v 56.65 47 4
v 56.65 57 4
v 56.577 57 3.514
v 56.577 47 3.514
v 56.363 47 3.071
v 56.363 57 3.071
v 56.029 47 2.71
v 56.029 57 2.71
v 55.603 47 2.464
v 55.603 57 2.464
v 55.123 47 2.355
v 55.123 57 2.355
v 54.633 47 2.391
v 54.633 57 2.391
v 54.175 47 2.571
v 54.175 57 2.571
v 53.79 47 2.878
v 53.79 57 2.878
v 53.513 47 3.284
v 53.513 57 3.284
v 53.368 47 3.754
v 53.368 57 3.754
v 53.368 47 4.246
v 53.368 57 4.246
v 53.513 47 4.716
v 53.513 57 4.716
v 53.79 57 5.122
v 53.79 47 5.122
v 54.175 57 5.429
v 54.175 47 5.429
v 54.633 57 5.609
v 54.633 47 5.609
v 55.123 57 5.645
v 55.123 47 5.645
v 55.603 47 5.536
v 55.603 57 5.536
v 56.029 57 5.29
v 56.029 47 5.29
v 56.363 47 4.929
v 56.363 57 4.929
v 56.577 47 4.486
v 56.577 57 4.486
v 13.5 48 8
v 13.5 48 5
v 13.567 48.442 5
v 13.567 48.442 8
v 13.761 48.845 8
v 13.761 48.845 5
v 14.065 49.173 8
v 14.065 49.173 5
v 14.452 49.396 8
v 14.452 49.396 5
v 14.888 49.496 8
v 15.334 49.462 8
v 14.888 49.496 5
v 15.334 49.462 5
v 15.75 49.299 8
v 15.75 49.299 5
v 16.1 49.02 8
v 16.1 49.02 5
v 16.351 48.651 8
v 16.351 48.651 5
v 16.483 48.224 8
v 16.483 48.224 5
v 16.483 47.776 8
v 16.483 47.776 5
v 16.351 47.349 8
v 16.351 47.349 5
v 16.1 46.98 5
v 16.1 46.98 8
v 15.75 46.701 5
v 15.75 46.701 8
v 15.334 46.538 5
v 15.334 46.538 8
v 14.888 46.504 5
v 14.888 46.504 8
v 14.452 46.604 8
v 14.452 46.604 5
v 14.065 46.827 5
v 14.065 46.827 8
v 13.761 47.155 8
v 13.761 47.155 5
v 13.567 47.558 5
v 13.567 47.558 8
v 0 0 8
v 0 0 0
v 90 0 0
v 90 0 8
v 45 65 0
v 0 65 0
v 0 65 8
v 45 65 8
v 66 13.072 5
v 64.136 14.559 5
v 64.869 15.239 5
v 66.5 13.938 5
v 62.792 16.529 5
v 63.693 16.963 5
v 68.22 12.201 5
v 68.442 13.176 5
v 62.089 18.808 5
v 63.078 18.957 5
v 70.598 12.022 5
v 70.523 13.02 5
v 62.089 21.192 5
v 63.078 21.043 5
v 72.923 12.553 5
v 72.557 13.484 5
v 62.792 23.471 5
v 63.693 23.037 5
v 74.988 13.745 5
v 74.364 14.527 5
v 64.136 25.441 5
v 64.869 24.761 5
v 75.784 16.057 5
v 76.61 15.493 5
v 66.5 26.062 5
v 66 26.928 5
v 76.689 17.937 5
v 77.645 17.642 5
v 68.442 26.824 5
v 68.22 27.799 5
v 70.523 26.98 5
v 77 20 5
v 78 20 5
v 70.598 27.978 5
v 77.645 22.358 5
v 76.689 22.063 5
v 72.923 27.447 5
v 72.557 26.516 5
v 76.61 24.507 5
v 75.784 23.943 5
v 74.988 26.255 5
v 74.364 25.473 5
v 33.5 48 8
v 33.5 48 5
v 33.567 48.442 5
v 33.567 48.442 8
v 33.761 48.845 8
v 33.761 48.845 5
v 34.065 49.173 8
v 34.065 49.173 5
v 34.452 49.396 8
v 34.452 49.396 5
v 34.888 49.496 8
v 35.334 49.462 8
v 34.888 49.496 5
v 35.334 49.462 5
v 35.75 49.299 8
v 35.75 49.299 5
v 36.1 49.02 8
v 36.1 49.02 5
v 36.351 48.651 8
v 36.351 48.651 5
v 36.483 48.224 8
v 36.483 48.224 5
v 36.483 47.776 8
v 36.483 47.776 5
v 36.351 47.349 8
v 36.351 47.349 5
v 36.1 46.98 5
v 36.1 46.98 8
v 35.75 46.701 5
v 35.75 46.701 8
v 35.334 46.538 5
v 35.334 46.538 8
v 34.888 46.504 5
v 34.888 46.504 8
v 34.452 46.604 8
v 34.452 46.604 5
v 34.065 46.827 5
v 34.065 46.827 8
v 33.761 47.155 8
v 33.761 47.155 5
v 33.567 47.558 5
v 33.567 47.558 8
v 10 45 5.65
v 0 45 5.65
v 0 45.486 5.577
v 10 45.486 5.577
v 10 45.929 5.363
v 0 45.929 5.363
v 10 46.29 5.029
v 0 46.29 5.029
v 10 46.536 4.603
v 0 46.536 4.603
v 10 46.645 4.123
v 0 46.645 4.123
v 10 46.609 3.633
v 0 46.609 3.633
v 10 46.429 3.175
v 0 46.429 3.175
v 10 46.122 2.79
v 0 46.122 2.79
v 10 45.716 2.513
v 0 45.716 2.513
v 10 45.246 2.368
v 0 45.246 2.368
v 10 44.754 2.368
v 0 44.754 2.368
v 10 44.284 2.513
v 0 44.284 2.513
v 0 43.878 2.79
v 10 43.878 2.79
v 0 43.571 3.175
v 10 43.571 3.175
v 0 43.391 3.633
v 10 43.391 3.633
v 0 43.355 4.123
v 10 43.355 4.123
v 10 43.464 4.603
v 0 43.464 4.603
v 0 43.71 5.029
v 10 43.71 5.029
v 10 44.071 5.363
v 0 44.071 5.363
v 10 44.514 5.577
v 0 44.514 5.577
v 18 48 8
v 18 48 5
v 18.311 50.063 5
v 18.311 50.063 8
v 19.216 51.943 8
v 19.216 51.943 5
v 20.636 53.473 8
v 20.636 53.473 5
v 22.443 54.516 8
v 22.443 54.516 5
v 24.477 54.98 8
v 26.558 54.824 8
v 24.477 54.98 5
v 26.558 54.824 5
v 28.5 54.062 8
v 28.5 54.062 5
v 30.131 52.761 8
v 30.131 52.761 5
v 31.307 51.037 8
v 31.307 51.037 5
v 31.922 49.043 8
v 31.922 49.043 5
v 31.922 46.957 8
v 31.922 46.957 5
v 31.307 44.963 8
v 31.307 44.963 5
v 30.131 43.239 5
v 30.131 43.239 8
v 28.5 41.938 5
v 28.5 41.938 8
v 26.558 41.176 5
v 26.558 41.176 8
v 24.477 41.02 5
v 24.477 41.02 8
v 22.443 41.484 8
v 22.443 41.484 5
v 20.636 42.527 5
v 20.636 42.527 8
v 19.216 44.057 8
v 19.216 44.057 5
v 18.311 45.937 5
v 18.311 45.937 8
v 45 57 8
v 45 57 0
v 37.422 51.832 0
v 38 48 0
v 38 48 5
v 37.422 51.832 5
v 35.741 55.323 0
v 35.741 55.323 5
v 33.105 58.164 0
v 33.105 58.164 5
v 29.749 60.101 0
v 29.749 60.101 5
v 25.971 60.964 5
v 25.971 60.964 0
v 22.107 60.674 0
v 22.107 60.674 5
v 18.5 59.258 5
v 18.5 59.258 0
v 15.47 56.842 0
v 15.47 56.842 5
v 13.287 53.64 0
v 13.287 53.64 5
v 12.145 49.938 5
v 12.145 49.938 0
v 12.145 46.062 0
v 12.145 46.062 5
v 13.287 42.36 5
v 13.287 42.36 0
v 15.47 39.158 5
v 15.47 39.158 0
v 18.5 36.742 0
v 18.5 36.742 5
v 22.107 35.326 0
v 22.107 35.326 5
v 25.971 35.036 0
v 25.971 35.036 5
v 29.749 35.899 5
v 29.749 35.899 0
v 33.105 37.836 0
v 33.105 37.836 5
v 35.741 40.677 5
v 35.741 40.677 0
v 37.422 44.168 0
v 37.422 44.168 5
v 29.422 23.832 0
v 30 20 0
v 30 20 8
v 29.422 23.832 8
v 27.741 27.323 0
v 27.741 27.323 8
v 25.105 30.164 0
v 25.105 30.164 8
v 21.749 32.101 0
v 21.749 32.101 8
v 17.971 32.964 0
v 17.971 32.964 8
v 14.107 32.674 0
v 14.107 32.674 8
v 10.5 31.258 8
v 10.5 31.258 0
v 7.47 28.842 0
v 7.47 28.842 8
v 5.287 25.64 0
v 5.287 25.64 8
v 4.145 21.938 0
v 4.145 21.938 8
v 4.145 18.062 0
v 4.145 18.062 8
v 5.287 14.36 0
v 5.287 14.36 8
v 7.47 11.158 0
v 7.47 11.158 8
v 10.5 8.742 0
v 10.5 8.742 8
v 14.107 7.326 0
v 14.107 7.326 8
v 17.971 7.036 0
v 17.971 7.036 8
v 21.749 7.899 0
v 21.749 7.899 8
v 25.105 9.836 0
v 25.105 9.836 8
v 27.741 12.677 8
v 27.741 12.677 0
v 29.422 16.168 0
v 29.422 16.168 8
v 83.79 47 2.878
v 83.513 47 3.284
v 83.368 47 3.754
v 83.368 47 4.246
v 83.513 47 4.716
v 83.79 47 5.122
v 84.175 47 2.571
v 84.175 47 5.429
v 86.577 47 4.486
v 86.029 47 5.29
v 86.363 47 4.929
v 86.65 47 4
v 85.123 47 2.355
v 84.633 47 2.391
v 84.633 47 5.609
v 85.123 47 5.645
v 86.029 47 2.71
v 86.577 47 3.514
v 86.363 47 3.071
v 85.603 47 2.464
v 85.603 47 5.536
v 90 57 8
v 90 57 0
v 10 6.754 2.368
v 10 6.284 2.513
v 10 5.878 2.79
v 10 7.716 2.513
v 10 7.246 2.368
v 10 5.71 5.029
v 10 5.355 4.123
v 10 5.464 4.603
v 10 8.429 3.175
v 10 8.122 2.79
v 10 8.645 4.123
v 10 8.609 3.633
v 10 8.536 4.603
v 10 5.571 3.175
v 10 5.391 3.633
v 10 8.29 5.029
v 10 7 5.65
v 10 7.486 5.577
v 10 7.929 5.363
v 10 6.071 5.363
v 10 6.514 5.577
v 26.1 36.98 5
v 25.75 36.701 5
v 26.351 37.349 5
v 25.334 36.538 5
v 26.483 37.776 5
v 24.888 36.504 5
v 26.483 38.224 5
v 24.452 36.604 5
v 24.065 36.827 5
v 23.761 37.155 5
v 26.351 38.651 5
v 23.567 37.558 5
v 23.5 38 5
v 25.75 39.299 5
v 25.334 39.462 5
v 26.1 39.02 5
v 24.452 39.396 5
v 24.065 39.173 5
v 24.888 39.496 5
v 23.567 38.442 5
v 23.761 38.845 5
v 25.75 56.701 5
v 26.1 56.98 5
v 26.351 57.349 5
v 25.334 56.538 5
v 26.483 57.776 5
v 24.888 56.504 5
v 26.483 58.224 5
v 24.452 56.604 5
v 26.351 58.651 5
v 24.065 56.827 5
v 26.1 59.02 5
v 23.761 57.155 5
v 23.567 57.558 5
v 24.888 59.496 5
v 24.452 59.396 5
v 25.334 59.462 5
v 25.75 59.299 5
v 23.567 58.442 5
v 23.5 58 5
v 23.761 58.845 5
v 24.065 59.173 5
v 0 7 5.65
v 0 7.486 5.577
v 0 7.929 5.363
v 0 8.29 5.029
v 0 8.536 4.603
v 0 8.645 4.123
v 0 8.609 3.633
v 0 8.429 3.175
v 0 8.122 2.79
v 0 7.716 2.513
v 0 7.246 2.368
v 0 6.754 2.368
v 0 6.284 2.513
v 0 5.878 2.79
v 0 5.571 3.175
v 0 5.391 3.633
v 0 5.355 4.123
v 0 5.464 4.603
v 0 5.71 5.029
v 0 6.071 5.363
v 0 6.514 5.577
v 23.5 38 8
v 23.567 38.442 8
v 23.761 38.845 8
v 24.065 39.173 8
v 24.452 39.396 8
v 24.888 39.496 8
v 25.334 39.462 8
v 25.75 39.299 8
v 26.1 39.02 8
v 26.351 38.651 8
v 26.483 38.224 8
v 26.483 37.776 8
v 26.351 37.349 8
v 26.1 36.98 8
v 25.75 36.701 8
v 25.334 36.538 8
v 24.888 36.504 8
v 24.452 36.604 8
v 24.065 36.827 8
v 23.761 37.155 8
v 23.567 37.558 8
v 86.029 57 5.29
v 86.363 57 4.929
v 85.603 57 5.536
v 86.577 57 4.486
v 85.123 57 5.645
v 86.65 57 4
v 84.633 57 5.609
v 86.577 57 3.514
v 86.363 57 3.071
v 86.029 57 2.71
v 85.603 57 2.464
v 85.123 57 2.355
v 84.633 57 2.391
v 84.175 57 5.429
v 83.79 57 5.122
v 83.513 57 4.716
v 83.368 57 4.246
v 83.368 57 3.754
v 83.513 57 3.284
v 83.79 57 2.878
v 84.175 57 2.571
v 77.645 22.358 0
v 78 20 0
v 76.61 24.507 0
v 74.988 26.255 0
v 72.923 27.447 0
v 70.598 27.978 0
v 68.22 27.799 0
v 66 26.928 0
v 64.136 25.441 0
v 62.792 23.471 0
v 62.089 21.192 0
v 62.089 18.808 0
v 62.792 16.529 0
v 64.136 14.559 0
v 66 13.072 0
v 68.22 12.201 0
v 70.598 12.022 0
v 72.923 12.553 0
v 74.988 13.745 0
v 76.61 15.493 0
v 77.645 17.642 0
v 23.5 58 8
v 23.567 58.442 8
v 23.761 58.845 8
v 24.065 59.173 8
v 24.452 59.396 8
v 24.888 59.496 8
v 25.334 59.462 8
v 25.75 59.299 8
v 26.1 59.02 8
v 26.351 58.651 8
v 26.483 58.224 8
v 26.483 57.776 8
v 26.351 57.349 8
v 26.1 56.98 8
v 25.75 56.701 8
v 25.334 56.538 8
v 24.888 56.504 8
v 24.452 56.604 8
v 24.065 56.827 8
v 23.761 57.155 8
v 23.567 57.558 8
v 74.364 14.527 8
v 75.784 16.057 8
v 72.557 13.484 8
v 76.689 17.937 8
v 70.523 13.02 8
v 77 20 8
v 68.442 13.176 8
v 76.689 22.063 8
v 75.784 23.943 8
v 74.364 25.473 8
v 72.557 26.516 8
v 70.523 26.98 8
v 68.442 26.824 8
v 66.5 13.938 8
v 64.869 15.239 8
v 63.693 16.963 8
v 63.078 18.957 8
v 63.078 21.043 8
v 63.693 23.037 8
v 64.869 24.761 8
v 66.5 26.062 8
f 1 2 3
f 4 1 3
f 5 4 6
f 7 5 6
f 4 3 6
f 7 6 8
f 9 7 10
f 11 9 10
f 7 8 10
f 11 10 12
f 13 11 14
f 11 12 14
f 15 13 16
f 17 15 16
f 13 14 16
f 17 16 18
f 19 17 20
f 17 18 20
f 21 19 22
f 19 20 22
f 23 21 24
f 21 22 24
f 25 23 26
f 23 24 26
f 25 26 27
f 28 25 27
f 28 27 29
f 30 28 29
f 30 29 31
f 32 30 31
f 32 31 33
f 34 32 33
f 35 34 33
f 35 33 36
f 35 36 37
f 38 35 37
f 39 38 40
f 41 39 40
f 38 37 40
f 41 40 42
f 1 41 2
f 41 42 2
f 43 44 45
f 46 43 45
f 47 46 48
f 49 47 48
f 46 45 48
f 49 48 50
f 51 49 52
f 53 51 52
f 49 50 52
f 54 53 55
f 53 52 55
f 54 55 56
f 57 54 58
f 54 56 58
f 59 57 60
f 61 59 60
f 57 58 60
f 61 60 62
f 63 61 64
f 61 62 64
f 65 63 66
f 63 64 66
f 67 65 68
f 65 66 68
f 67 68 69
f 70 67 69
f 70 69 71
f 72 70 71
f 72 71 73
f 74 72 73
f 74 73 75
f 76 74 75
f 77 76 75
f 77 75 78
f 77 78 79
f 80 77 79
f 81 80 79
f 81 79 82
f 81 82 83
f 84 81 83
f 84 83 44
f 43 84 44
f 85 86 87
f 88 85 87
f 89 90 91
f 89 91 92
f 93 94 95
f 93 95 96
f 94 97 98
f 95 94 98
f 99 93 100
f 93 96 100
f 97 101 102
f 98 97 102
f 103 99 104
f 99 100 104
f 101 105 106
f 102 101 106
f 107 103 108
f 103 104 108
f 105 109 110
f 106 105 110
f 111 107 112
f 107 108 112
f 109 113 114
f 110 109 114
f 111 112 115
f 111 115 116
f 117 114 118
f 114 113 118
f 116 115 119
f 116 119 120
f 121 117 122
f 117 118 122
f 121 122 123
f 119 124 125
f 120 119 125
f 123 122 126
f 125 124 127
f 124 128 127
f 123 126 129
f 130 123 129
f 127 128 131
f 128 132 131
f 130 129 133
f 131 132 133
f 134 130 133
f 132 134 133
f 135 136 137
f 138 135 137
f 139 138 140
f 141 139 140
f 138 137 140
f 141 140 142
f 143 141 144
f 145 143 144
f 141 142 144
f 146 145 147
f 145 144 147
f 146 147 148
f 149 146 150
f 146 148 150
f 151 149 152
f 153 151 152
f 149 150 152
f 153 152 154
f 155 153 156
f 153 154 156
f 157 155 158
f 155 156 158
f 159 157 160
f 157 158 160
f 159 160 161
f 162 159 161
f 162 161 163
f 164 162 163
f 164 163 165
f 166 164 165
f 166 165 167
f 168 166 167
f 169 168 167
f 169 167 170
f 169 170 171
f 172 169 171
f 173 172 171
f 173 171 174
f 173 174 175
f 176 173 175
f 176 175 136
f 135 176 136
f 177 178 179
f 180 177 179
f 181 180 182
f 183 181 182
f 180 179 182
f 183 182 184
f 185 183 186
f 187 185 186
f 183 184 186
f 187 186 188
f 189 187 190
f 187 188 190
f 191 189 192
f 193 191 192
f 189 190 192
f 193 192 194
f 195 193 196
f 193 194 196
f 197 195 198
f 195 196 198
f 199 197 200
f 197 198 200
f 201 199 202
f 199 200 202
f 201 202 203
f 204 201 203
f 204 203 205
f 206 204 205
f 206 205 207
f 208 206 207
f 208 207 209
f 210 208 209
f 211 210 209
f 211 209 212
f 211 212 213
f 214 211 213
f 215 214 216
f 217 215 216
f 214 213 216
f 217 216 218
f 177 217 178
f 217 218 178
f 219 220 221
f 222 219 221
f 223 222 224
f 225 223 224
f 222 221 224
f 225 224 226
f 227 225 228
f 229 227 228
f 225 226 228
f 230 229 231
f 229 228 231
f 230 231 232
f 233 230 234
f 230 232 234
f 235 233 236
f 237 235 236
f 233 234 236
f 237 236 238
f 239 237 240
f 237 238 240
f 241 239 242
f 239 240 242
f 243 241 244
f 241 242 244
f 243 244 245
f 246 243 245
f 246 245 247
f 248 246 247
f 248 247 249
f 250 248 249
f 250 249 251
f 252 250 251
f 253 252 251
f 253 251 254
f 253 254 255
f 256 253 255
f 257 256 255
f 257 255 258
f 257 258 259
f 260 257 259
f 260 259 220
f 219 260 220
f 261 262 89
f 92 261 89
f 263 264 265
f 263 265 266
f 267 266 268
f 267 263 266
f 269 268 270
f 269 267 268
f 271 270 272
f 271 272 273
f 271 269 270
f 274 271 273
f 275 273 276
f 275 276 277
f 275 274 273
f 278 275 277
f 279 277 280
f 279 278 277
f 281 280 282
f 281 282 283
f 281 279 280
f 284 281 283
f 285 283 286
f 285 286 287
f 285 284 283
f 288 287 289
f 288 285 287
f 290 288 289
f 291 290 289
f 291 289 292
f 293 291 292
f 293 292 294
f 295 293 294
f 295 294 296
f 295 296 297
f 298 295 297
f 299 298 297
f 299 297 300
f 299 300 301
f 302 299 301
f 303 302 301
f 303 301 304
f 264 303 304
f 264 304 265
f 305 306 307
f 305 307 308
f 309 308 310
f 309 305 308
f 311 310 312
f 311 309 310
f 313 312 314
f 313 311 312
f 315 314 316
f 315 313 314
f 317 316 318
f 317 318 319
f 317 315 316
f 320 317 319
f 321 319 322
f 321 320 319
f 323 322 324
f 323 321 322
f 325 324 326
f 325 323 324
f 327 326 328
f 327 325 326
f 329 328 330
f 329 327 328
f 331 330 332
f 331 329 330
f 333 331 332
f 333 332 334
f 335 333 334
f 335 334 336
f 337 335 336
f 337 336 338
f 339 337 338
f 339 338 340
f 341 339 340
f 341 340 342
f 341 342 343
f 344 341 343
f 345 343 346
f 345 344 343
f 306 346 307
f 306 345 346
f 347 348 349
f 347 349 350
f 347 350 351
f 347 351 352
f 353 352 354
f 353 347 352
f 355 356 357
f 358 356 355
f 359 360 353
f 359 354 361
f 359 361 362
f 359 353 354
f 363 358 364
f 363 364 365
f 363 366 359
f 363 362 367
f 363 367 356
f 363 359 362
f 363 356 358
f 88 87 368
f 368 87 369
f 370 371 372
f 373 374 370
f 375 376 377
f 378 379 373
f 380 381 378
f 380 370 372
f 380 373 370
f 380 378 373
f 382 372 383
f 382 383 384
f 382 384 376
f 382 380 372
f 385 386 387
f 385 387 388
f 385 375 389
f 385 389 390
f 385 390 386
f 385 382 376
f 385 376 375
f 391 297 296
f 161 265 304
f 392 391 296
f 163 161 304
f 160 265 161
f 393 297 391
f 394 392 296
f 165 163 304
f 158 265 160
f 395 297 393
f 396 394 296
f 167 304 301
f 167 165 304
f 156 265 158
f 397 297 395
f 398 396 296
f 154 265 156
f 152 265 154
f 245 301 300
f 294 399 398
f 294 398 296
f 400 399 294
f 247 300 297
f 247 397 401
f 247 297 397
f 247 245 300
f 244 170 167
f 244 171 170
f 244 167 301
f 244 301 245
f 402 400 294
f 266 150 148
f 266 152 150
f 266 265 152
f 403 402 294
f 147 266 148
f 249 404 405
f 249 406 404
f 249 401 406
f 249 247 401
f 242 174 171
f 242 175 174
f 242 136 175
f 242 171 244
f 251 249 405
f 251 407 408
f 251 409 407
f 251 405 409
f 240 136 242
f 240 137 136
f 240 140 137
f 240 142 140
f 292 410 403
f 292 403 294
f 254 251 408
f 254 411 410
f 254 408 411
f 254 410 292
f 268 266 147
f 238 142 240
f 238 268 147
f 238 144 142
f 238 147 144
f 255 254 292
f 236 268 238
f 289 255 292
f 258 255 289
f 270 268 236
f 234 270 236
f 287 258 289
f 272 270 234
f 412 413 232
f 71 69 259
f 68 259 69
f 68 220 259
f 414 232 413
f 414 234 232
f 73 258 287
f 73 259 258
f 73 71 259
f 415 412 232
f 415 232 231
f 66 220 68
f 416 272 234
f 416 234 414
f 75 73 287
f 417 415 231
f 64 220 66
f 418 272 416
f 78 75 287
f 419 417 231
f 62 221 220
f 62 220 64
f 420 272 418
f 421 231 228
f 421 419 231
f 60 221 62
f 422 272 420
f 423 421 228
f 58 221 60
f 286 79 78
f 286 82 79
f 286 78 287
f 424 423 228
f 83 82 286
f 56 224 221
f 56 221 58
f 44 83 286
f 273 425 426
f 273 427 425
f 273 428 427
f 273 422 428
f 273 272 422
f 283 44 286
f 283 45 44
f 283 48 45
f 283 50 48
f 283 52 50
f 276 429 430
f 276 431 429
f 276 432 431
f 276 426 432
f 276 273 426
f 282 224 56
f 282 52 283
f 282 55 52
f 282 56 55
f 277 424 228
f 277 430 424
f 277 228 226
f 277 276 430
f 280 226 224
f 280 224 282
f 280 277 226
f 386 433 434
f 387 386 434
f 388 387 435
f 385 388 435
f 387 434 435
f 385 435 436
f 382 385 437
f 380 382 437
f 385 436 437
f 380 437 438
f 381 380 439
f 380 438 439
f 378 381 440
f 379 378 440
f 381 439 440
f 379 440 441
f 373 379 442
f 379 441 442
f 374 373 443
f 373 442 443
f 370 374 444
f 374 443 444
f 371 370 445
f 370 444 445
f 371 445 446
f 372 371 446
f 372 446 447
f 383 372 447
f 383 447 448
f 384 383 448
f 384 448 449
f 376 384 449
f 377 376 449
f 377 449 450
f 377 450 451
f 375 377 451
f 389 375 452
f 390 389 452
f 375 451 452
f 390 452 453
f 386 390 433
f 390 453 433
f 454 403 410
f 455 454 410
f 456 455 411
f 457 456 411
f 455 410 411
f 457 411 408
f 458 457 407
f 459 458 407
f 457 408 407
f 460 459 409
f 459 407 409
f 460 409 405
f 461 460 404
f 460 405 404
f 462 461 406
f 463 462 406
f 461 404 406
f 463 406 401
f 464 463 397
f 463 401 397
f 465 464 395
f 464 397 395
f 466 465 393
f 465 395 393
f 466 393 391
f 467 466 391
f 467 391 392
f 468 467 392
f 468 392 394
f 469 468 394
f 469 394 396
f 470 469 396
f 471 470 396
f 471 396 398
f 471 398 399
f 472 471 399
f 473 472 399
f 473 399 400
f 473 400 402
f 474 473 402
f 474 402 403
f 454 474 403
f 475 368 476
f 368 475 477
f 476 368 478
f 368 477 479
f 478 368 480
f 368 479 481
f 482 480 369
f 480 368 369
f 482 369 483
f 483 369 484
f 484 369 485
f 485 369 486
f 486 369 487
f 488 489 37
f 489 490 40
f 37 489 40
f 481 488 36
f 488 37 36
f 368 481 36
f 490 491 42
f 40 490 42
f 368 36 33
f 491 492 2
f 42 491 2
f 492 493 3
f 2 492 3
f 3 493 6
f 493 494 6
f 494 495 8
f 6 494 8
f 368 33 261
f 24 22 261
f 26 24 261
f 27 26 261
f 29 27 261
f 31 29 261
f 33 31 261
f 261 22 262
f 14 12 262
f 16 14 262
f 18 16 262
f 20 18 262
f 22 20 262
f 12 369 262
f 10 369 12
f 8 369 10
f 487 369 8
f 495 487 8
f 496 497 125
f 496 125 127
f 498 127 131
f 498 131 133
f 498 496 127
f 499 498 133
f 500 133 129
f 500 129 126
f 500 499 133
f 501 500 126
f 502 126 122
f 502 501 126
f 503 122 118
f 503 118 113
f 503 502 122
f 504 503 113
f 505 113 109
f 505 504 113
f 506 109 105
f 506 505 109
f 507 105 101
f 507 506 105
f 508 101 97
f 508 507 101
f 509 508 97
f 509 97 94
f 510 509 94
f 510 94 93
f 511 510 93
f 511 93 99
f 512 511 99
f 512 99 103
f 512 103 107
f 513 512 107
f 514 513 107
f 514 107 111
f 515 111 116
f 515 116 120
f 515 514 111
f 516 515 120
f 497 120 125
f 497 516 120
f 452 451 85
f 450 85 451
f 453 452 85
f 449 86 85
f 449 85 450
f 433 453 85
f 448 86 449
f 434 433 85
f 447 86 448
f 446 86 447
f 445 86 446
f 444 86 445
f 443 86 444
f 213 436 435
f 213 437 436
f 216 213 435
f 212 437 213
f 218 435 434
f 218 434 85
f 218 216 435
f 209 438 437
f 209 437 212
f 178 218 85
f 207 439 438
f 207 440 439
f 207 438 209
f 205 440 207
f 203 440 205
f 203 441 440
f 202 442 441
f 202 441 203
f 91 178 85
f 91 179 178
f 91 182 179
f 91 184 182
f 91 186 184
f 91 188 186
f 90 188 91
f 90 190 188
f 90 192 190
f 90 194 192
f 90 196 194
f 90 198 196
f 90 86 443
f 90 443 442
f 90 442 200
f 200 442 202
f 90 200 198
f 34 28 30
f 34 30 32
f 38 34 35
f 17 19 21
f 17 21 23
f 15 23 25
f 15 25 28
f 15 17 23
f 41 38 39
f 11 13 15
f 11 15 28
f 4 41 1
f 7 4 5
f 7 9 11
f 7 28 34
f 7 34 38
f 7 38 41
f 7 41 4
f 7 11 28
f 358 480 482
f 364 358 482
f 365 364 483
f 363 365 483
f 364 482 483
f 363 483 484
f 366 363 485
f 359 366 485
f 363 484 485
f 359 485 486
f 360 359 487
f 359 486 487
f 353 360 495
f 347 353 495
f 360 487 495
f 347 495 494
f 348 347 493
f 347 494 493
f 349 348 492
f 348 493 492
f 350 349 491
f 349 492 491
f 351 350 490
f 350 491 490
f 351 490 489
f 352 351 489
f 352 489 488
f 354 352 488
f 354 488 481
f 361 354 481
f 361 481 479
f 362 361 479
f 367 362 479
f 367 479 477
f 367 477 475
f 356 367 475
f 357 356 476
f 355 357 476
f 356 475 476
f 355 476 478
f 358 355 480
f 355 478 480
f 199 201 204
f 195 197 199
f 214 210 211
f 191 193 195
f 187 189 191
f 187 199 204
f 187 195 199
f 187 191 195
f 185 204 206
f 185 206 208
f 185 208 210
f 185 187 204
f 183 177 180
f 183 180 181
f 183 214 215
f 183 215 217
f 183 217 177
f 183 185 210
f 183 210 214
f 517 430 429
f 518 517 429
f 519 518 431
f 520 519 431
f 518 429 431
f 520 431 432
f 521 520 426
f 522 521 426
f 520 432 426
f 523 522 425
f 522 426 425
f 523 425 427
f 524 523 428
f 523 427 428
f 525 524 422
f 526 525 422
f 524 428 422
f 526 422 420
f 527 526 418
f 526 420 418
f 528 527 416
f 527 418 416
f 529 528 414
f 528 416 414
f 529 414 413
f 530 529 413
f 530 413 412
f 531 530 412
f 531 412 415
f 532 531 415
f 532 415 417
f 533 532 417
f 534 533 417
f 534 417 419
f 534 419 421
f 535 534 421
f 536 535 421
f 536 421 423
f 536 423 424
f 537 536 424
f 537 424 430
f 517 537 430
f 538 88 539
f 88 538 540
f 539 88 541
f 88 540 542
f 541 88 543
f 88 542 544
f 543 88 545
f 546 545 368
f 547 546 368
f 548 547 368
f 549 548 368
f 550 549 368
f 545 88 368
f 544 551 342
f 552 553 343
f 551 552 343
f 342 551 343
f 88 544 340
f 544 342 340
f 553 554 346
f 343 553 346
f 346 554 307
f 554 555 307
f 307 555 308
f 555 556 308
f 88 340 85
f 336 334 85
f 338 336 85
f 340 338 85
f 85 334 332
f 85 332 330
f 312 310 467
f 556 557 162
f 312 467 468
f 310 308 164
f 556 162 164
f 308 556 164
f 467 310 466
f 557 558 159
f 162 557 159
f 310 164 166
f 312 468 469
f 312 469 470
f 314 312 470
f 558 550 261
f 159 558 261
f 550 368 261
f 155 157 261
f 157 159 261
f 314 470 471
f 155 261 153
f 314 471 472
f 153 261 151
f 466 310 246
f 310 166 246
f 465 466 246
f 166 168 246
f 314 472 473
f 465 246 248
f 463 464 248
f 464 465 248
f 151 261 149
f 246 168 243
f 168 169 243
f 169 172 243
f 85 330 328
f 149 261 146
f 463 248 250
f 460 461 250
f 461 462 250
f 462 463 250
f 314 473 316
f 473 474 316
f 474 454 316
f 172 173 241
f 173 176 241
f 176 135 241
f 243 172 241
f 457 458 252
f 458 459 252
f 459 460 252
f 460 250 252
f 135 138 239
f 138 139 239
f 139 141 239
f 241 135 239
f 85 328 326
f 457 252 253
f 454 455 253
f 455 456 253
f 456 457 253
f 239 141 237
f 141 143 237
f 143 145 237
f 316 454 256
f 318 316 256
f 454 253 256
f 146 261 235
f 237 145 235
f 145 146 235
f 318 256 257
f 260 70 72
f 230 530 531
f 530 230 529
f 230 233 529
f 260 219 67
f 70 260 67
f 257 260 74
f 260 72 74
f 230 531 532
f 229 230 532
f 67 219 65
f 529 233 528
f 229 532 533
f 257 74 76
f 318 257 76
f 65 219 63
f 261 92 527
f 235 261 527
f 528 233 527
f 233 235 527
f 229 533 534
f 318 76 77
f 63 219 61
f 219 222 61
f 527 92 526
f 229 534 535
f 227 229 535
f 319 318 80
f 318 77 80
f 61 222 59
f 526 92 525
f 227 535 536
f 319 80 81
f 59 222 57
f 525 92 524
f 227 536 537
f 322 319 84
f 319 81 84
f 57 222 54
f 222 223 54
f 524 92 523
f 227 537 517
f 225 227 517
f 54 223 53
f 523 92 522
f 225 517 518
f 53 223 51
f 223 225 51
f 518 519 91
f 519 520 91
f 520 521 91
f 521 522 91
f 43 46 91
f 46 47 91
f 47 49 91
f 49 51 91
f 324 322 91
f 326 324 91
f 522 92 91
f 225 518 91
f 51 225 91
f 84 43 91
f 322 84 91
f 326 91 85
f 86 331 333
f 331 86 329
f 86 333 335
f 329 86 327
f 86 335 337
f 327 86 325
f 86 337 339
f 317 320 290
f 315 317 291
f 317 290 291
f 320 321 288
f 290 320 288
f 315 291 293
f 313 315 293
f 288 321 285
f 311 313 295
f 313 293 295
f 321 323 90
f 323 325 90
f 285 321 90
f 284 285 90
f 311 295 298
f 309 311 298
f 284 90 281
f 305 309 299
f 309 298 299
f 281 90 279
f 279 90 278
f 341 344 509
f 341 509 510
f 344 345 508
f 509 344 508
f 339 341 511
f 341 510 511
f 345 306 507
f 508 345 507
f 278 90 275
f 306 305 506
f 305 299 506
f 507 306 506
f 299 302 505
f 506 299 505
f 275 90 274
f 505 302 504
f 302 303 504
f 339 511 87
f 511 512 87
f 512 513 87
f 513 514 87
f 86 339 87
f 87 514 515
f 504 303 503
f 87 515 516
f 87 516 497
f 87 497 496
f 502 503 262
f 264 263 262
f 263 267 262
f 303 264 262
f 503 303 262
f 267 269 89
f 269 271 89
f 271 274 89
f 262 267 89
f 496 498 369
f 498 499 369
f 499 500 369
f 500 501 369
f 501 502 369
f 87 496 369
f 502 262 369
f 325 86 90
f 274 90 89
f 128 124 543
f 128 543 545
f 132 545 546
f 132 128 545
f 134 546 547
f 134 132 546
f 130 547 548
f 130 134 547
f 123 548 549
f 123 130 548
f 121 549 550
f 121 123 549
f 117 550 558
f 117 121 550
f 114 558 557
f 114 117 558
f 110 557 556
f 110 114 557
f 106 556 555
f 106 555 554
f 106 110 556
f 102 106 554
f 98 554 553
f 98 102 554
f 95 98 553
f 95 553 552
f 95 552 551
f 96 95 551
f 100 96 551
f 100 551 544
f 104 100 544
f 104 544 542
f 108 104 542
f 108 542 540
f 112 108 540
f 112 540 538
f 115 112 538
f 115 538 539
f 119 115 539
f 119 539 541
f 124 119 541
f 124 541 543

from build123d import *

# Parameters (mm, degrees)
ESQUISSE1_W             = 90
ESQUISSE1_H             = 65
ESQUISSE1_R             = 7
ESQUISSE1_R_2           = 13
BOSS_EXTRU_1_DEPTH      = 8
BOSS_EXTRU_2_START      = -8
ESQUISSE2_R             = 13
BOSS_EXTRU_2_DEPTH      = 3
ESQUISSE3_R             = 7
ESQUISSE3_R_2           = 1.5
ENL_V_MAT_EXTRU_1_DEPTH = 4
ENL_V_START             = -8
ESQUISSE4_R             = 8
ENL_V_MAT_EXTRU_2_DEPTH = 5
ESQUISSE5_W             = 45
ESQUISSE5_H             = 8
ENL_V_MAT_EXTRU_3_DEPTH = 9
ESQUISSE6_R             = 1.65
ENL_V_MAT_EXTRU_4_DEPTH = 10
ESQUISSE7_R             = 1.65
ENL_V_MAT_EXTRU_5_DEPTH = 10


with BuildPart() as part:
    # Esquisse1 → Boss.-Extru.1 (new body)
    with BuildSketch(Plane.XY):
        with Locations((45, 32.5)):
            Rectangle(ESQUISSE1_W, ESQUISSE1_H)
        with Locations((70, 20)):
            Circle(ESQUISSE1_R, mode=Mode.SUBTRACT)
        with Locations((17, 20)):
            Circle(ESQUISSE1_R_2, mode=Mode.SUBTRACT)
        with Locations((25, 48)):
            Circle(ESQUISSE1_R_2, mode=Mode.SUBTRACT)
    extrude(amount=BOSS_EXTRU_1_DEPTH)

    # Esquisse2 → Boss.-Extru.2 (add)
    with BuildSketch(Plane(origin=(0, 0, 0), x_dir=(-1, 0, 0), z_dir=(0, 0, -1)).offset(BOSS_EXTRU_2_START)):
        with Locations((-25, 48)):
            Circle(ESQUISSE2_R)
    extrude(amount=BOSS_EXTRU_2_DEPTH)

    # Esquisse3 → Enlèv. mat.-Extru.1 (cut, through all)
    with BuildSketch(Plane(origin=(0, 0, 5), x_dir=(-1, 0, 0), z_dir=(0, 0, -1))):
        with Locations((-25, 48)):
            Circle(ESQUISSE3_R)
        with Locations((-15, 48)):
            Circle(ESQUISSE3_R_2)
        with Locations((-25, 38)):
            Circle(ESQUISSE3_R_2)
        with Locations((-35, 48)):
            Circle(ESQUISSE3_R_2)
        with Locations((-25, 58)):
            Circle(ESQUISSE3_R_2)
    extrude(amount=-ENL_V_MAT_EXTRU_1_DEPTH, mode=Mode.SUBTRACT)

    # Esquisse4 → Enlèv. mat.-Extru.2 (cut)
    with BuildSketch(Plane.XY.offset(8).offset(ENL_V_START)):
        with Locations((70, 20)):
            Circle(ESQUISSE4_R)
    extrude(amount=ENL_V_MAT_EXTRU_2_DEPTH, mode=Mode.SUBTRACT)

    # Esquisse5 → Enlèv. mat.-Extru.3 (cut, through all)
    with BuildSketch(Plane(origin=(0, 0, 0), x_dir=(-1, 0, 0), z_dir=(0, 0, -1))):
        with Locations((-67.5, 61)):
            Rectangle(ESQUISSE5_W, ESQUISSE5_H)
    extrude(amount=-ENL_V_MAT_EXTRU_3_DEPTH, mode=Mode.SUBTRACT)

    # Esquisse6 → Enlèv. mat.-Extru.4 (cut)
    with BuildSketch(Plane.ZY):
        with Locations((4, 45)):
            Circle(ESQUISSE6_R)
        with Locations((4, 7)):
            Circle(ESQUISSE6_R)
    extrude(amount=-ENL_V_MAT_EXTRU_4_DEPTH, mode=Mode.SUBTRACT)

    # Esquisse7 → Enlèv. mat.-Extru.5 (cut)
    with BuildSketch(Plane(origin=(0, 57, 0), x_dir=(1, 0, 0), z_dir=(0, 1, 0))):
        with Locations((85, -4)):
            Circle(ESQUISSE7_R)
        with Locations((55, -4)):
            Circle(ESQUISSE7_R)
    extrude(amount=-ENL_V_MAT_EXTRU_5_DEPTH, mode=Mode.SUBTRACT)


solid = part.part
